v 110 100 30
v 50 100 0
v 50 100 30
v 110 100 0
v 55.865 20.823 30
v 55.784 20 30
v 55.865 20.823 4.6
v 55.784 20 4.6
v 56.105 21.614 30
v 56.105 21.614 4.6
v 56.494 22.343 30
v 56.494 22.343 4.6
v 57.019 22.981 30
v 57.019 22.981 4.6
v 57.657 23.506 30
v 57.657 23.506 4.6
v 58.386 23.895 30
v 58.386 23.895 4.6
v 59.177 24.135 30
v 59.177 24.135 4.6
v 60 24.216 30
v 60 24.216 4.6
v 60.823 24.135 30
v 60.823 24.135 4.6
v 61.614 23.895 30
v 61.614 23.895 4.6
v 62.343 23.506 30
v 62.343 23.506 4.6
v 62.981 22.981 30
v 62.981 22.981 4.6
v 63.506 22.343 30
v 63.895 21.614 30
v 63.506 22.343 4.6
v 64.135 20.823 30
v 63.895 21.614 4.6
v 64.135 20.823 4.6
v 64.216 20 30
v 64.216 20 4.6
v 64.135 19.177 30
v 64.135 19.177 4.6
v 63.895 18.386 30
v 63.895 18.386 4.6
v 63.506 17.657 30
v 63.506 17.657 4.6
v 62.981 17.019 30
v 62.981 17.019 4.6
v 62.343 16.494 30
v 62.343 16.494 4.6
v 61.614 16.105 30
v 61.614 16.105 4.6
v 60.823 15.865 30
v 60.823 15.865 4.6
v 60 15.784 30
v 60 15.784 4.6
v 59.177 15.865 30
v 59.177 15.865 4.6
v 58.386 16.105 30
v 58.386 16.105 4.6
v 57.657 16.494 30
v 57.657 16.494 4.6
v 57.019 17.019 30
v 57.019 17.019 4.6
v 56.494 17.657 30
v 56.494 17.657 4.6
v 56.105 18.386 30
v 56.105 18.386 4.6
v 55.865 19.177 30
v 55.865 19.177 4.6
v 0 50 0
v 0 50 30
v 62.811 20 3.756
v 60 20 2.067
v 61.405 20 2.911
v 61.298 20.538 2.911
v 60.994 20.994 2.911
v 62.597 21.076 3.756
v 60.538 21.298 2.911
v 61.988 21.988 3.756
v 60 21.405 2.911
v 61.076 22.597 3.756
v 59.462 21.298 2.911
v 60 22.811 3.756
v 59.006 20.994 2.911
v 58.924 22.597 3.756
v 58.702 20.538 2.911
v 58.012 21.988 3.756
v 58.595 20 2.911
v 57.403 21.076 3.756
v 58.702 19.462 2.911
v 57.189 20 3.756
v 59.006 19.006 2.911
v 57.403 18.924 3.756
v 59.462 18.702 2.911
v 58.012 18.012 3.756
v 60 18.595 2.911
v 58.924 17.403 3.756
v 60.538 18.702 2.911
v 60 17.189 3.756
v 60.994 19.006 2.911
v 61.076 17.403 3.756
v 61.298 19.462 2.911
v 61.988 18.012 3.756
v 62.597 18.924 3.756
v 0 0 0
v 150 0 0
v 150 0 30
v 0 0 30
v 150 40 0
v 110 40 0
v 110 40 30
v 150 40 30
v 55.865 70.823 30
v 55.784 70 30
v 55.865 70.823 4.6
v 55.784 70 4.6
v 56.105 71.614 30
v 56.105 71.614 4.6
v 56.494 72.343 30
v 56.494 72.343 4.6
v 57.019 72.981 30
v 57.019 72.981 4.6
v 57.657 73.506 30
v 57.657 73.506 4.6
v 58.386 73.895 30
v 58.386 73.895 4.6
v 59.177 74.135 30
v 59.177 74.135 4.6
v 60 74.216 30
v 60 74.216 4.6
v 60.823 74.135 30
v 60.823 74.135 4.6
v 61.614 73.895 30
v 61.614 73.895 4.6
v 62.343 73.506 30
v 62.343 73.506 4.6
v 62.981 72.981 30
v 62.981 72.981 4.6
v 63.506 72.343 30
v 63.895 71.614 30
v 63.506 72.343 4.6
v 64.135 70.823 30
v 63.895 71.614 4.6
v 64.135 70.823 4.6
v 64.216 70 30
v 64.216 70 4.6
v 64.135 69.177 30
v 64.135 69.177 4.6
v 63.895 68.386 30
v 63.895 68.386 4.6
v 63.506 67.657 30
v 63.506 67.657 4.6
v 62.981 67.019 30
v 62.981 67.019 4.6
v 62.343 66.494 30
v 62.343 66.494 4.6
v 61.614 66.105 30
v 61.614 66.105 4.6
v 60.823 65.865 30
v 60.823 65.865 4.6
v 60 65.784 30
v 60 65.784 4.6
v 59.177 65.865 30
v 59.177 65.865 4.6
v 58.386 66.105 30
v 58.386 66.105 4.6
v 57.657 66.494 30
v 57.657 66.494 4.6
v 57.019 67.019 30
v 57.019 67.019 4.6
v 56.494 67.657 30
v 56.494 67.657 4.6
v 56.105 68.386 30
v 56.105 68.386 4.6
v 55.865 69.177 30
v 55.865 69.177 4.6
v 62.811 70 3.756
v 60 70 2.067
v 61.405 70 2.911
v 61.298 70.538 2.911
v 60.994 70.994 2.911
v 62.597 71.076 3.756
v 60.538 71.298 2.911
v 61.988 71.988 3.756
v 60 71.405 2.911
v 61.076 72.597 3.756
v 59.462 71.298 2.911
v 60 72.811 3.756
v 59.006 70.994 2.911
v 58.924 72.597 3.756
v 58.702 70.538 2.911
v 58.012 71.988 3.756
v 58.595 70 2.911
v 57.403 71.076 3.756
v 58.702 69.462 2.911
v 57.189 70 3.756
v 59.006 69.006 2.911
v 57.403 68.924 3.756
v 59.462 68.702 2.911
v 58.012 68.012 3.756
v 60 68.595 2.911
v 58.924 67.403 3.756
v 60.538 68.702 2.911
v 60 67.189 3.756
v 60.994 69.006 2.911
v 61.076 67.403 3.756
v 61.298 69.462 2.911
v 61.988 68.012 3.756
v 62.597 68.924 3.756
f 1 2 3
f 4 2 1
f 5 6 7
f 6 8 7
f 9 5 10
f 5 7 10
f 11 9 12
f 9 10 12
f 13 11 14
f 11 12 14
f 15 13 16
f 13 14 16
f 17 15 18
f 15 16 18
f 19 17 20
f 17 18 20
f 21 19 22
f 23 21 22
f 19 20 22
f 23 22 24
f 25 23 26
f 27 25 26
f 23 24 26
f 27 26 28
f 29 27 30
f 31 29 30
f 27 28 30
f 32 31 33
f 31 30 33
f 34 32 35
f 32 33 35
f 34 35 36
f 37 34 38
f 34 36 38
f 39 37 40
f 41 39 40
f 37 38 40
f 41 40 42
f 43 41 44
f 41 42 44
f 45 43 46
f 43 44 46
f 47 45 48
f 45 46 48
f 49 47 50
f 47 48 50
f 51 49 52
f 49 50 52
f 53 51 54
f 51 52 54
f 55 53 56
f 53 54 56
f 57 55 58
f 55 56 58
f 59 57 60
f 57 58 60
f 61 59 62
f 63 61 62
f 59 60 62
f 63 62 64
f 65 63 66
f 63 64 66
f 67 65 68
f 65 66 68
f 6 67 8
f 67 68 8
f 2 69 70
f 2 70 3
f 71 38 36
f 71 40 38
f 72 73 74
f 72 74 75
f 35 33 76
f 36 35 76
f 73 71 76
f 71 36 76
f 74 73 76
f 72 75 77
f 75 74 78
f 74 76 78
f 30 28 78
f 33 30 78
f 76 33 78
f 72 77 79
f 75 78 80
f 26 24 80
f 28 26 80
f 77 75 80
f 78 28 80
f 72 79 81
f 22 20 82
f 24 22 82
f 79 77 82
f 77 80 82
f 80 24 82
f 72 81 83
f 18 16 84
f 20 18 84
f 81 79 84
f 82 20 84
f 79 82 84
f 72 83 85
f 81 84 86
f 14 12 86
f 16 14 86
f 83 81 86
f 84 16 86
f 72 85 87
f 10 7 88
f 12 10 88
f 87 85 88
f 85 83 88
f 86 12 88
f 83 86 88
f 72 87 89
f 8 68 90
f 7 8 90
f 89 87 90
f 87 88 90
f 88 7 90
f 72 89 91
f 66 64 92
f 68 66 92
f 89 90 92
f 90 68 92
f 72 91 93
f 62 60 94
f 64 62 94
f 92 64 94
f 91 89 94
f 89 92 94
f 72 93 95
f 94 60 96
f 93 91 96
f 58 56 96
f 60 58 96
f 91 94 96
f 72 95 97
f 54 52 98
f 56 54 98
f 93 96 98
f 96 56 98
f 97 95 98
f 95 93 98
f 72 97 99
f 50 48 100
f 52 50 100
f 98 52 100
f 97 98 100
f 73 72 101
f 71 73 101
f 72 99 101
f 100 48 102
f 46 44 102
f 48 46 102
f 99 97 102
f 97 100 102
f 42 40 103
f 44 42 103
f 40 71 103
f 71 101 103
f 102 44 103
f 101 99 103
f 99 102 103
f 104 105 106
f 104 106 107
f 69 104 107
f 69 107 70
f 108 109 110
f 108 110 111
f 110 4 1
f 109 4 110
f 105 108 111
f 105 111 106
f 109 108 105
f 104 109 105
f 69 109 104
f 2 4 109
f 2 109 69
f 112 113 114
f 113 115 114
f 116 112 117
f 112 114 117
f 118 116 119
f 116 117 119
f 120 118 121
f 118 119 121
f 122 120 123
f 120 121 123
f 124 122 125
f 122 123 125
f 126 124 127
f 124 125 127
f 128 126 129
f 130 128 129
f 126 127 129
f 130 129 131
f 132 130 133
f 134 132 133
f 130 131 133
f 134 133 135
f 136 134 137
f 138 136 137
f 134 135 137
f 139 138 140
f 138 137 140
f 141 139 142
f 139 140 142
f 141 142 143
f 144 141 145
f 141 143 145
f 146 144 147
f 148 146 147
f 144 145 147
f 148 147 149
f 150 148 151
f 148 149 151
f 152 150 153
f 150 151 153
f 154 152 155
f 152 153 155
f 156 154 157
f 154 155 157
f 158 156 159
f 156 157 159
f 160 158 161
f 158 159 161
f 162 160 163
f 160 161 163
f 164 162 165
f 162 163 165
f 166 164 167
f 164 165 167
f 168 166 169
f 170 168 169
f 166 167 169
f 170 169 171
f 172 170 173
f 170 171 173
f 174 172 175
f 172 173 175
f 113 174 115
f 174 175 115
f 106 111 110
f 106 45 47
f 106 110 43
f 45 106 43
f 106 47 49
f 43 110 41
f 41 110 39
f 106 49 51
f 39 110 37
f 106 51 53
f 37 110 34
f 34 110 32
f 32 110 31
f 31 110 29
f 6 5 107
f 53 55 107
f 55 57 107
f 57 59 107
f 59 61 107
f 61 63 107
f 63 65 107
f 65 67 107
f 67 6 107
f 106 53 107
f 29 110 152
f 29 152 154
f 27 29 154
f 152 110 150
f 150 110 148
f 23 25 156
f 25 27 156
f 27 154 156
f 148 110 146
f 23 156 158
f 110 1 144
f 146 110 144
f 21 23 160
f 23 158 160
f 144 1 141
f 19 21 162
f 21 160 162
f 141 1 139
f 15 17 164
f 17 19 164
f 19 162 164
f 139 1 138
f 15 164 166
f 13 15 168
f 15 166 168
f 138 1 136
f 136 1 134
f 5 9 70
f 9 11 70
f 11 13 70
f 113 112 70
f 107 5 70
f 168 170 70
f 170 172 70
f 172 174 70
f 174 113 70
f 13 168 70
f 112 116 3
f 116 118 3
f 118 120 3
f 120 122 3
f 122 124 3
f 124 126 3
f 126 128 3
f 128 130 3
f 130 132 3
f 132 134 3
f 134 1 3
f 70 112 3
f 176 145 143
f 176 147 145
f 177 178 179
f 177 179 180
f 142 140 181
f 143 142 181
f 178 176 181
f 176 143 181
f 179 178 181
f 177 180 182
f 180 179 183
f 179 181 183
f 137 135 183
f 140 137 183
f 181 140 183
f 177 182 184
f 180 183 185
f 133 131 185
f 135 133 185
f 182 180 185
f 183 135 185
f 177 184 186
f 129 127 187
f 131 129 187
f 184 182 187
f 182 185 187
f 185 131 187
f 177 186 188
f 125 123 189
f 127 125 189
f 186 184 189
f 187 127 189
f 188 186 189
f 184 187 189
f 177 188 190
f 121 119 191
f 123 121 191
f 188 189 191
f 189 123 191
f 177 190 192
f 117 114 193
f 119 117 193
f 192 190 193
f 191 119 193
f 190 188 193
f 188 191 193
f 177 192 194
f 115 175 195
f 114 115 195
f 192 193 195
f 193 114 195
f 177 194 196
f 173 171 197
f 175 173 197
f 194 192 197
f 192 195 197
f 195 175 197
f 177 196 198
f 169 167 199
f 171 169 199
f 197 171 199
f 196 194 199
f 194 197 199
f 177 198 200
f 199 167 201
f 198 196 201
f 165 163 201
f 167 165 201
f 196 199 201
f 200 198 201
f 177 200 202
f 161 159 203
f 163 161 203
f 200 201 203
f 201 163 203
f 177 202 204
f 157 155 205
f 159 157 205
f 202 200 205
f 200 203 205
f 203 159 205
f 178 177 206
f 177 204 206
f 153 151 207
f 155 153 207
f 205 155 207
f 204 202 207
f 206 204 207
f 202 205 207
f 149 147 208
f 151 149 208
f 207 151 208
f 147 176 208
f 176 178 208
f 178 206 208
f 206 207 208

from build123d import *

# Parameters (mm, degrees)
SALIENTE_EXTRUIR1_DEPTH            = 30
TALADRO_DE_MARGEN_PARA_5_161_D     = 8.4328
TALADRO_DE_MARGEN_PARA_5_161_DEPTH = 25.4
TALADRO_DE_MARGEN_PARA_5_161_TIP   = 2.533468714


with BuildPart() as part:
    # Croquis1 → Saliente-Extruir1 (new body)
    with BuildSketch(Plane.XY):
        Polygon((0, 0), (0, 50), (50, 100), (110, 100), (110, 40), (150, 40), (150, 0), align=None)
    extrude(amount=SALIENTE_EXTRUIR1_DEPTH)

    # Taladro de margen para 5/161
    with Locations(Plane(origin=(60, 70, 30), x_dir=(1, 0, 0), z_dir=(0, 0, 1))):
        with Locations((0, 0), (0, -50)):
            Hole(TALADRO_DE_MARGEN_PARA_5_161_D / 2, depth=TALADRO_DE_MARGEN_PARA_5_161_DEPTH)
            with Locations((0, 0, -(TALADRO_DE_MARGEN_PARA_5_161_DEPTH + TALADRO_DE_MARGEN_PARA_5_161_TIP / 2))):  # 118° drill point
                Cone(0, TALADRO_DE_MARGEN_PARA_5_161_D / 2, TALADRO_DE_MARGEN_PARA_5_161_TIP, mode=Mode.SUBTRACT)


solid = part.part
